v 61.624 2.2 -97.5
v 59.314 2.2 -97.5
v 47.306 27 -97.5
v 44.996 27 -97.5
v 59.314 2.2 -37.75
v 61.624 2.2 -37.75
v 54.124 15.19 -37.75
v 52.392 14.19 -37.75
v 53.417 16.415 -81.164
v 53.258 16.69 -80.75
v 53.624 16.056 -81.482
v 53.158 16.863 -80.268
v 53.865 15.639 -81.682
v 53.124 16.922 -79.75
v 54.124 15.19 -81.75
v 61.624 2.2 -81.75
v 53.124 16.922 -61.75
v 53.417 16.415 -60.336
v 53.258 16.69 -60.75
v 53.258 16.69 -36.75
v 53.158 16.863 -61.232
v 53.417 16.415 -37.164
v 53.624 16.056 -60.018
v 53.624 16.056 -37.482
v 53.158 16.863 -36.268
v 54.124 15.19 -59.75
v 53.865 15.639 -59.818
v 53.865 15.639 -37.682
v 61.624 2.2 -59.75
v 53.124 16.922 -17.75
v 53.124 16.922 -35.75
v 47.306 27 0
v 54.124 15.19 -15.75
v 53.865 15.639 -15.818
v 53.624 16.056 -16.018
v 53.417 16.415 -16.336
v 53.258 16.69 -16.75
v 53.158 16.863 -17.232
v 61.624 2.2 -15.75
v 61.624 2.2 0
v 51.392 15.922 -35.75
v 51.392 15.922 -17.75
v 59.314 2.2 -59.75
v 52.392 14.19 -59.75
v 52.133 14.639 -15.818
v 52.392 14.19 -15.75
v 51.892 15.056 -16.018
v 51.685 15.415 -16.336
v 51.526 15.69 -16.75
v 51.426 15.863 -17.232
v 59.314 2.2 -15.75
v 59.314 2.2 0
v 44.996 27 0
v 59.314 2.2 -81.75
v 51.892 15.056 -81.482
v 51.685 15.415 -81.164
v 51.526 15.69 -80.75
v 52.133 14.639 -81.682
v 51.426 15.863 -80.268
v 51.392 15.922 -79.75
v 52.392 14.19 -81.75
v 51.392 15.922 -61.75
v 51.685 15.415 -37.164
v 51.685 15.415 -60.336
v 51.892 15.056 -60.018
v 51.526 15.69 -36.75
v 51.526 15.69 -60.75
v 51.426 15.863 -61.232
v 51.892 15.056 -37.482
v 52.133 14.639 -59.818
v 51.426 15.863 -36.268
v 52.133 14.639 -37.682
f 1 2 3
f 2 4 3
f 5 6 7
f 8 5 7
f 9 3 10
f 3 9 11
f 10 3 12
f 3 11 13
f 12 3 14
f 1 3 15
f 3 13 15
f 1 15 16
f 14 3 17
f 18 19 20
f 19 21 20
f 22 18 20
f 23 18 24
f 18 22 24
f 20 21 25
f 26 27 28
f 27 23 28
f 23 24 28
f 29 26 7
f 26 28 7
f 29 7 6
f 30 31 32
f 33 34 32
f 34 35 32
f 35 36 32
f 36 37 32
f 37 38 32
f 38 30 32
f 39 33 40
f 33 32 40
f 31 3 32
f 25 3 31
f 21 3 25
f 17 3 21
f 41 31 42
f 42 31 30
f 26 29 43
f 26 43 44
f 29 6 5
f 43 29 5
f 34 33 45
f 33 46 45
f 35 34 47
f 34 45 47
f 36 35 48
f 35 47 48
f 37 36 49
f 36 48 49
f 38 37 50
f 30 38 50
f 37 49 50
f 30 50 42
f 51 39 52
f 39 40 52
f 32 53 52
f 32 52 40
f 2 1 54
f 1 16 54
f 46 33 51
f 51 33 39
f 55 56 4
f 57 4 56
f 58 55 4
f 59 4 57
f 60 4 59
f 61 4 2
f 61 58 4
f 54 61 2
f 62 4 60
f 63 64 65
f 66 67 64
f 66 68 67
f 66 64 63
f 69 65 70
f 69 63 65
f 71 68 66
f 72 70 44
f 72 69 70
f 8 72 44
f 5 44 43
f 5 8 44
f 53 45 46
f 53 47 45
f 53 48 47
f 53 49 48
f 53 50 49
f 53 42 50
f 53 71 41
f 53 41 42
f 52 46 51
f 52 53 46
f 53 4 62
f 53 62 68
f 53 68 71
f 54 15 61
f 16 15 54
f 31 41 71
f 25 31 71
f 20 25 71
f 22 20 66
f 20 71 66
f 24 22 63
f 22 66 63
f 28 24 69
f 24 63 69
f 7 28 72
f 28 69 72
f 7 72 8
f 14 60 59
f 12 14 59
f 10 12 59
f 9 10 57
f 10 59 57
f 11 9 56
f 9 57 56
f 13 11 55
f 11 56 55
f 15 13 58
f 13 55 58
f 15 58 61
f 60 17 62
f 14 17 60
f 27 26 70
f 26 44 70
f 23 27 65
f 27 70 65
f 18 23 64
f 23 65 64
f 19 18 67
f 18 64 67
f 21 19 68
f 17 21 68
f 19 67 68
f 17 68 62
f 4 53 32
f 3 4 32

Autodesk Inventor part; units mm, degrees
ref_plane "YZ Plane" through (0, 0, 0) normal (1, 0, 0) x (0, 1, 0)
ref_plane "XZ Plane" through (0, 0, 0) normal (0, 1, 0) x (-1, 0, 0)
sketch "Sketch1" plane through (0, 0, 0) normal (0, 0, 1) x (1, 0, 0)
  line L0 (44.9961, 27) -> (47.3055, 27)
  line L1 (47.3055, 27) -> (61.6238, 2.2)
  line L2 (61.6238, 2.2) -> (59.3144, 2.2)
  line L3 (59.3144, 2.2) -> (44.9961, 27) construction
  line L4 (44.9961, 27) -> (59.3144, 2.2)
  line L5 (16.5, 27) -> (44.9961, 27) construction
  point P0 (0, 0)
  dimension "d10" = 2
ref_plane "Work Plane1" through (0, 0, -97.5) normal (0, 0, -1) x (0, 1, 0)
extrude "Extrusion1" add sketch "Sketch1" against normal up to surface (97.5 mm away)
sketch "Sketch2" plane through (47.3055, 27, 0) normal (0.8660254, 0.5, 0) x (0, 0, -1)
  line L0 (15.75, -28.6366) -> (37.75, -28.6366)
  line L1 (37.75, -28.6366) -> (37.75, -11.6366)
  line L2 (37.75, -11.6366) -> (15.75, -11.6366)
  line L3 (15.75, -11.6366) -> (15.75, -28.6366)
  line L4 (0, 0) -> (97.5, 0) construction
  line L5 (48.75, 0) -> (48.75, -28.6366) construction
  line L6 (0, -28.6366) -> (97.5, -28.6366) construction
  line L7 (81.75, -28.6366) -> (59.75, -28.6366)
  line L8 (59.75, -28.6366) -> (59.75, -11.6366)
  line L9 (59.75, -11.6366) -> (81.75, -11.6366)
  line L10 (81.75, -11.6366) -> (81.75, -28.6366)
  point P0 (0, 0.2701)
  dimension "d4" = 22
  dimension "d5" = 22
  dimension "d6" = 17
extrude "Extrusion2" cut sketch "Sketch2" against normal through all
fillet "Fillet1" radius 2 4 edges at (52.2577, 16.4224, -37.75) (52.2577, 16.4224, -15.75) (52.2577, 16.4224, -59.75) (52.2577, 16.4224, -81.75)
properties part number "Przod" material "Aluminum 6061"
